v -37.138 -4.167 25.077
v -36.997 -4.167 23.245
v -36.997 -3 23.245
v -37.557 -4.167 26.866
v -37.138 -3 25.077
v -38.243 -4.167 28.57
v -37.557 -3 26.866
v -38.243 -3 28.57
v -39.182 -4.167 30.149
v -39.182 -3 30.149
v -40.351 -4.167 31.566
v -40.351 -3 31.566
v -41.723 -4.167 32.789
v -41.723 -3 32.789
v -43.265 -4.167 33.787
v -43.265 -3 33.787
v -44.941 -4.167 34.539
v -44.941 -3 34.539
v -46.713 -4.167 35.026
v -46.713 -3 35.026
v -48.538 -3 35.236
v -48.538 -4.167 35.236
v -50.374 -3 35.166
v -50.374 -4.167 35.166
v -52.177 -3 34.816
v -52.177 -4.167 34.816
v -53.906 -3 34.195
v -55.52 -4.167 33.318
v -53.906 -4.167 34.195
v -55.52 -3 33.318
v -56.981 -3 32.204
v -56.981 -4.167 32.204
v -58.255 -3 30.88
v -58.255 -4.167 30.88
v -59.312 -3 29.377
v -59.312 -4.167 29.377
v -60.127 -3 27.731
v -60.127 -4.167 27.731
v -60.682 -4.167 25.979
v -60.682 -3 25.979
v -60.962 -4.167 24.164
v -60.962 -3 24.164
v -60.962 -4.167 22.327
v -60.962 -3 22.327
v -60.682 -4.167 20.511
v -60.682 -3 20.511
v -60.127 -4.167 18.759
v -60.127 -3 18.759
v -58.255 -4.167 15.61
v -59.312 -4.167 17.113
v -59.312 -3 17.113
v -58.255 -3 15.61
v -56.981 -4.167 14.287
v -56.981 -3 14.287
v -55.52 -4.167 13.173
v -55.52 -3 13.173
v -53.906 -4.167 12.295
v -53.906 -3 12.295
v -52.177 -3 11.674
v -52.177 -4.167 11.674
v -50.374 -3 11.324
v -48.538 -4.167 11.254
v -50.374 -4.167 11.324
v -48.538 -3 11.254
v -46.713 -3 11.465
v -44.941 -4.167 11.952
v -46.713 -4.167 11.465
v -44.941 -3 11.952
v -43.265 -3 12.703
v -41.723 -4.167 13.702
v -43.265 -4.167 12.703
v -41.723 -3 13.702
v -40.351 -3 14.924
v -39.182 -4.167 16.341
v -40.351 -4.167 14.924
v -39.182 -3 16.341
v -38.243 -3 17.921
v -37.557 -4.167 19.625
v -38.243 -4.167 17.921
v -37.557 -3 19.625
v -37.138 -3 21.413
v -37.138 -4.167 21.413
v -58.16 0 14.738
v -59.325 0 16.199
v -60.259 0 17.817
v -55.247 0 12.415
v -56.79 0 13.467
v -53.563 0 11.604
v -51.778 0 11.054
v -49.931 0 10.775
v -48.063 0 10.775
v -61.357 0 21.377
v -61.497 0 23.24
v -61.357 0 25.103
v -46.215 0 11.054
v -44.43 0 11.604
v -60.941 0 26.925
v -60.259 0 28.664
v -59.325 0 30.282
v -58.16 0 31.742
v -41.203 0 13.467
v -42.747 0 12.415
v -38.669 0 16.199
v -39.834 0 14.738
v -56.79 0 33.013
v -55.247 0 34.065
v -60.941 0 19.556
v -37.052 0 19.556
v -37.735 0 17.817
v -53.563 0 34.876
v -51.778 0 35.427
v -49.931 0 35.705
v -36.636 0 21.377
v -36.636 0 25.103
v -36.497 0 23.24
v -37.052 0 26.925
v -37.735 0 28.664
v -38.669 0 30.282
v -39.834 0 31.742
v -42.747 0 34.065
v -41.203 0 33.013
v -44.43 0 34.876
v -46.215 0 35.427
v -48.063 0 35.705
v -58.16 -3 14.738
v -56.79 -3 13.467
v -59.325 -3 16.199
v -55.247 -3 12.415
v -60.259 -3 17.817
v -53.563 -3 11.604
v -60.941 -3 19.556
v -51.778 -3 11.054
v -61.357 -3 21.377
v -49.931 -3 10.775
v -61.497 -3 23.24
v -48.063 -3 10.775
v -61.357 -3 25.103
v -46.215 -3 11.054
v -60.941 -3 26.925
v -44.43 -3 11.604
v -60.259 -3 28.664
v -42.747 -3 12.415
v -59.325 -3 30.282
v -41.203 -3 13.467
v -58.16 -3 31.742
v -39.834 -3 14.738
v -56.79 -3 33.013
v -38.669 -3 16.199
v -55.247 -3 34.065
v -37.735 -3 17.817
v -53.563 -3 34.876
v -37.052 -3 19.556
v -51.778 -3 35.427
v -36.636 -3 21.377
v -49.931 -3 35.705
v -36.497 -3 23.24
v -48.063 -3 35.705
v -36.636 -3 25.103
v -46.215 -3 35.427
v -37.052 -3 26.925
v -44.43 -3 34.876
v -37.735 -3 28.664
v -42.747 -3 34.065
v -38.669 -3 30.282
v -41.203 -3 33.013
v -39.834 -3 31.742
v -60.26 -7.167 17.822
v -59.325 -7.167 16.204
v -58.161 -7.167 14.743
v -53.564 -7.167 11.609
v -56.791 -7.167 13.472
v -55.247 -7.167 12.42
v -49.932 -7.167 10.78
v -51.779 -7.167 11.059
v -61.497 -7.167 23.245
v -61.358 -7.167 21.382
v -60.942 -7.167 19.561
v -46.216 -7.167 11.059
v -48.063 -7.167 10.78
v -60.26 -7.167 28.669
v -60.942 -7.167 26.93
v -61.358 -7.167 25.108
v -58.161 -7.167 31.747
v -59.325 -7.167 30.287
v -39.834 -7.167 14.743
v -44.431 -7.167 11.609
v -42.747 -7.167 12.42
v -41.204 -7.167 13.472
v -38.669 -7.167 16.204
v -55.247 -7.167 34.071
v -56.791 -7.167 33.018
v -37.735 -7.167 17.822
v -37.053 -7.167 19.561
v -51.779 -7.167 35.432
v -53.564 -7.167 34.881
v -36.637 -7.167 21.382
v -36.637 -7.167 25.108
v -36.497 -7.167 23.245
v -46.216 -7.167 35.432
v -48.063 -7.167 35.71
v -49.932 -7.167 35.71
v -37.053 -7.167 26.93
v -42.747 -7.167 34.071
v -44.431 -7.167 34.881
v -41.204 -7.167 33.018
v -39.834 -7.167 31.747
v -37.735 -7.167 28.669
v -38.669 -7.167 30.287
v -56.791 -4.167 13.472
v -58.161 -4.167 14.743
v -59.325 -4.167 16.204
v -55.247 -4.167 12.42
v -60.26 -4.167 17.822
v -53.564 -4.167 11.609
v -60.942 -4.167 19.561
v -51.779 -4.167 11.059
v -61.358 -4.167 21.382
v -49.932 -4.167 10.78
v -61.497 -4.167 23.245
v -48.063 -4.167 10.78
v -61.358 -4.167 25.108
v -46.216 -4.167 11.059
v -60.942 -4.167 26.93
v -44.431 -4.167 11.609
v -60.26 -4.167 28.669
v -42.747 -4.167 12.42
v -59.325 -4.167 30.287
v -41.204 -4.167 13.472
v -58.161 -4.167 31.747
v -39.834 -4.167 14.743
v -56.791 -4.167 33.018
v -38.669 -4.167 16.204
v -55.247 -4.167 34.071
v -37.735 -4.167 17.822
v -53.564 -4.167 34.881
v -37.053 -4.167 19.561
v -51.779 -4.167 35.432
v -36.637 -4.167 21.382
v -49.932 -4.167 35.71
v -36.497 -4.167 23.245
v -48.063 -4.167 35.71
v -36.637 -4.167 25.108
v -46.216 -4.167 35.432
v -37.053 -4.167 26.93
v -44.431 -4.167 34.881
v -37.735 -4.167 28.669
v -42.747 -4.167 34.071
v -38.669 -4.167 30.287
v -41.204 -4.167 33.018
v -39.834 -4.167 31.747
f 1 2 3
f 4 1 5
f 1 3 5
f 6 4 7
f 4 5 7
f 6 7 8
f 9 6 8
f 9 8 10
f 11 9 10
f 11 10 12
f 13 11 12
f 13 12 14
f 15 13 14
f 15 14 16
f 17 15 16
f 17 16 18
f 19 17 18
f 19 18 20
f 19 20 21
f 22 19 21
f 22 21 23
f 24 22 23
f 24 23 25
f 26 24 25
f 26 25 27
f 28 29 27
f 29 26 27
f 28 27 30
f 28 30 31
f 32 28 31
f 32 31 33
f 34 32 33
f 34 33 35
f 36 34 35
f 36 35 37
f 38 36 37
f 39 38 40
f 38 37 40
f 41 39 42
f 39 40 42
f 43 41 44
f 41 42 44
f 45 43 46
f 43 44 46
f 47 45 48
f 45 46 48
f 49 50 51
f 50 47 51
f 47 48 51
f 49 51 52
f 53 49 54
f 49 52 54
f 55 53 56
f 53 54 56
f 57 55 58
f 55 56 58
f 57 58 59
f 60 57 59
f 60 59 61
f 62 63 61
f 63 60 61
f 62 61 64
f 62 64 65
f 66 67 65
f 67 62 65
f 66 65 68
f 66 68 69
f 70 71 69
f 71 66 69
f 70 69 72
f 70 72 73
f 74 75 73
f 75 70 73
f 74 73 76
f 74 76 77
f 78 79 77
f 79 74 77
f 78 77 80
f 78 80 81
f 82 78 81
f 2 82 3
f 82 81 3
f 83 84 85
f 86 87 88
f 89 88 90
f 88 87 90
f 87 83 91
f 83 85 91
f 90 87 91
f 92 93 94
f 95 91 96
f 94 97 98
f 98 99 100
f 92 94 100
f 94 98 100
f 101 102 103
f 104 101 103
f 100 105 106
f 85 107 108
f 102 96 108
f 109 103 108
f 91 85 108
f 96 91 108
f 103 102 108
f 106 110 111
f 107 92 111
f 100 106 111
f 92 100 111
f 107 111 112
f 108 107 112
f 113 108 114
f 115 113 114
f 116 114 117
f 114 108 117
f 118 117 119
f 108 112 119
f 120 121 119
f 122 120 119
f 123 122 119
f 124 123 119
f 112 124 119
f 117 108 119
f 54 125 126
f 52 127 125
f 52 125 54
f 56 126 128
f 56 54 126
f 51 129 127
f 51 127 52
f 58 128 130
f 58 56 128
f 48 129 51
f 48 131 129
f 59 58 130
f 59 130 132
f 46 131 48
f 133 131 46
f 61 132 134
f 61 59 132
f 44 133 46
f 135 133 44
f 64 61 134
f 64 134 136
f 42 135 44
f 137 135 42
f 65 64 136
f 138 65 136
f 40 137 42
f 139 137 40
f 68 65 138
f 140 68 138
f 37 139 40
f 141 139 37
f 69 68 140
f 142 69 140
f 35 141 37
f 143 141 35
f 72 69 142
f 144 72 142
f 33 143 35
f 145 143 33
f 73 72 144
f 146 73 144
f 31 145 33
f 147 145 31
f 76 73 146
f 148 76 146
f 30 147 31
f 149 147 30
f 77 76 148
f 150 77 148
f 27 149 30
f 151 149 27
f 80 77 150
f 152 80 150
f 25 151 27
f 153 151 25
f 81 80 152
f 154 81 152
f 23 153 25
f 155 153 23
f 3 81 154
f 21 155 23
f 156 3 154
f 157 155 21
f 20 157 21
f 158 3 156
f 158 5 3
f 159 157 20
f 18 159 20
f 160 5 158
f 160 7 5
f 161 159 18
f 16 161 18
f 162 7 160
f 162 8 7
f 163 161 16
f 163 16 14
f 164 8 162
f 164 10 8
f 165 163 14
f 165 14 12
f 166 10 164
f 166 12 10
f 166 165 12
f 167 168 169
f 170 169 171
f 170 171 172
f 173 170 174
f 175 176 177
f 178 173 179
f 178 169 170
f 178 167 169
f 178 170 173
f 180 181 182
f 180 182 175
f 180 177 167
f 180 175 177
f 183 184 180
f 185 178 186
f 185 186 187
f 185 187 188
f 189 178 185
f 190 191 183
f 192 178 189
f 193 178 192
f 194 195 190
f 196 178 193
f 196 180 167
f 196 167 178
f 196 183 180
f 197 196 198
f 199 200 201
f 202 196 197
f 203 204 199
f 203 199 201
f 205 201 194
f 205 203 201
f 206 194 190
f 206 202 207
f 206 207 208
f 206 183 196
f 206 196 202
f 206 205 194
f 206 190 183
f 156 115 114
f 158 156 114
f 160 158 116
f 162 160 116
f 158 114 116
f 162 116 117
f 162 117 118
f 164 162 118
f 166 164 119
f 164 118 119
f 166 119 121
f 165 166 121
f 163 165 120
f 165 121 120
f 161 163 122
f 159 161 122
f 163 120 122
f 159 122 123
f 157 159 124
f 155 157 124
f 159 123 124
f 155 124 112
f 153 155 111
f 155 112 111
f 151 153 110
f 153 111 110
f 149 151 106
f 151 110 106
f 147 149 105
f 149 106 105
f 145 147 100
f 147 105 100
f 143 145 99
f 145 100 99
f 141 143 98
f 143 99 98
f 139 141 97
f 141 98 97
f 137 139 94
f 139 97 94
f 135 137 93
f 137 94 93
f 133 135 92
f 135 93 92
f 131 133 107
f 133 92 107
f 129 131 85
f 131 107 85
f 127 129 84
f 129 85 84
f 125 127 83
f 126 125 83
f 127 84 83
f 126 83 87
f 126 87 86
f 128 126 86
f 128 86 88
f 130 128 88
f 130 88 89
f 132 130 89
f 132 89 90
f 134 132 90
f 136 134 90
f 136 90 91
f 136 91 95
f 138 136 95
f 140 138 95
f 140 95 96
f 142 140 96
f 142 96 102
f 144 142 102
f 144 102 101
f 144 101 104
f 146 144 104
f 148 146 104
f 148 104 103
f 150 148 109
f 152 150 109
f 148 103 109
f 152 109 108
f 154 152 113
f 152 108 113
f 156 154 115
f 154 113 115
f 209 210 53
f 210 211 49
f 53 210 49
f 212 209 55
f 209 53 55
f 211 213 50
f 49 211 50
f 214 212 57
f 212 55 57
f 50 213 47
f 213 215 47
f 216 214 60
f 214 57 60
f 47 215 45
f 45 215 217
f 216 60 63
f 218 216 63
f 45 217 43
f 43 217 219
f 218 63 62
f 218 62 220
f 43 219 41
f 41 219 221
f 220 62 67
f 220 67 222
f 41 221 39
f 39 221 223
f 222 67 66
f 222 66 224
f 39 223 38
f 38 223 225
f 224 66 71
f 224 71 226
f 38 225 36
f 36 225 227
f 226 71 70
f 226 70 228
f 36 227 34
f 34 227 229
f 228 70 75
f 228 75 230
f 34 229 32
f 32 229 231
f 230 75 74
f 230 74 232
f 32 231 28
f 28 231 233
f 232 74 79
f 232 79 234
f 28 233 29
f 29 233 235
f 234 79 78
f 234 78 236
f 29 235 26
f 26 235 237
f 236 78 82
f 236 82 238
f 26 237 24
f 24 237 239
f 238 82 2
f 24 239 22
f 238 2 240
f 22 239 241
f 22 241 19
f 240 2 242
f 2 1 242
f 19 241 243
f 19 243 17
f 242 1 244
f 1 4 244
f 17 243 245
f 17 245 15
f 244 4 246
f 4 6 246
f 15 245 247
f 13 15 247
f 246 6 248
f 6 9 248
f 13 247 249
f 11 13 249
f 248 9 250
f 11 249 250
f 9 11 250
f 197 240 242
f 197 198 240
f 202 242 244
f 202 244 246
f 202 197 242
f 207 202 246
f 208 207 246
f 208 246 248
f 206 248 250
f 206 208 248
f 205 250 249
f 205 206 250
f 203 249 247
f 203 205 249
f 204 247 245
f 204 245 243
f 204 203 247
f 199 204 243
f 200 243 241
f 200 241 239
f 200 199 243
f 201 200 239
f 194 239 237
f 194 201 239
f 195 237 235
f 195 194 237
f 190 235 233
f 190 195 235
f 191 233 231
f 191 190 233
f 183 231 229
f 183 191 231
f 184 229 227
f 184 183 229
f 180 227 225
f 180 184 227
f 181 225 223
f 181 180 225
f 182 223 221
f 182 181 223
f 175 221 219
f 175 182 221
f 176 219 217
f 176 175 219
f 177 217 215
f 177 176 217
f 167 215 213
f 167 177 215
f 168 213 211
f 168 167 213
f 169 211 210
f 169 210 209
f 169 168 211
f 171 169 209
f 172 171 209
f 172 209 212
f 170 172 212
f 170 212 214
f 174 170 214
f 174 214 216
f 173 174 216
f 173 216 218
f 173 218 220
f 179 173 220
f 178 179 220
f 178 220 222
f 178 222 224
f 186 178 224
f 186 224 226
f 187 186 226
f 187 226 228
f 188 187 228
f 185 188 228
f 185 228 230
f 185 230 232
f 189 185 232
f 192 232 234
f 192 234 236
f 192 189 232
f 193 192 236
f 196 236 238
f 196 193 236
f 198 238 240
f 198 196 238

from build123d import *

# Parameters (mm, degrees)
F0_R          = 12.5
F1_DEPTH      = 3
F2_R          = 12
F3_DEPTH      = 1.666667
F4_R          = 12.5
F4_R_2        = 12
F5_DEPTH      = 2.5
F5_DEPTH_BACK = 0.5


with BuildPart() as f1:
    # F0 (on Front) → F1 (new body)
    with BuildSketch(Plane.XZ):
        with Locations((-48.996713, 23.240132)):
            Circle(F0_R)
    extrude(amount=F1_DEPTH)

    # F2 (on face) → F3 (join)
    with BuildSketch(Plane.XZ.offset(3)):
        with Locations((-48.997421, 23.245247)):
            Circle(F2_R)
    extrude(amount=F3_DEPTH)

    # F4 (on face) → F5 (join, two sides)
    with BuildSketch(Plane.XZ.offset(4.666667)) as f5_sk:
        with Locations((-48.997421, 23.245247)):
            Circle(F4_R)
        with Locations((-48.997421, 23.245247)):
            Circle(F4_R_2, mode=Mode.SUBTRACT)
        with Locations((-48.997421, 23.245247)):
            Circle(F4_R_2)
    extrude(amount=F5_DEPTH)
    extrude(f5_sk.sketch, amount=-F5_DEPTH_BACK)


solid = f1.part
